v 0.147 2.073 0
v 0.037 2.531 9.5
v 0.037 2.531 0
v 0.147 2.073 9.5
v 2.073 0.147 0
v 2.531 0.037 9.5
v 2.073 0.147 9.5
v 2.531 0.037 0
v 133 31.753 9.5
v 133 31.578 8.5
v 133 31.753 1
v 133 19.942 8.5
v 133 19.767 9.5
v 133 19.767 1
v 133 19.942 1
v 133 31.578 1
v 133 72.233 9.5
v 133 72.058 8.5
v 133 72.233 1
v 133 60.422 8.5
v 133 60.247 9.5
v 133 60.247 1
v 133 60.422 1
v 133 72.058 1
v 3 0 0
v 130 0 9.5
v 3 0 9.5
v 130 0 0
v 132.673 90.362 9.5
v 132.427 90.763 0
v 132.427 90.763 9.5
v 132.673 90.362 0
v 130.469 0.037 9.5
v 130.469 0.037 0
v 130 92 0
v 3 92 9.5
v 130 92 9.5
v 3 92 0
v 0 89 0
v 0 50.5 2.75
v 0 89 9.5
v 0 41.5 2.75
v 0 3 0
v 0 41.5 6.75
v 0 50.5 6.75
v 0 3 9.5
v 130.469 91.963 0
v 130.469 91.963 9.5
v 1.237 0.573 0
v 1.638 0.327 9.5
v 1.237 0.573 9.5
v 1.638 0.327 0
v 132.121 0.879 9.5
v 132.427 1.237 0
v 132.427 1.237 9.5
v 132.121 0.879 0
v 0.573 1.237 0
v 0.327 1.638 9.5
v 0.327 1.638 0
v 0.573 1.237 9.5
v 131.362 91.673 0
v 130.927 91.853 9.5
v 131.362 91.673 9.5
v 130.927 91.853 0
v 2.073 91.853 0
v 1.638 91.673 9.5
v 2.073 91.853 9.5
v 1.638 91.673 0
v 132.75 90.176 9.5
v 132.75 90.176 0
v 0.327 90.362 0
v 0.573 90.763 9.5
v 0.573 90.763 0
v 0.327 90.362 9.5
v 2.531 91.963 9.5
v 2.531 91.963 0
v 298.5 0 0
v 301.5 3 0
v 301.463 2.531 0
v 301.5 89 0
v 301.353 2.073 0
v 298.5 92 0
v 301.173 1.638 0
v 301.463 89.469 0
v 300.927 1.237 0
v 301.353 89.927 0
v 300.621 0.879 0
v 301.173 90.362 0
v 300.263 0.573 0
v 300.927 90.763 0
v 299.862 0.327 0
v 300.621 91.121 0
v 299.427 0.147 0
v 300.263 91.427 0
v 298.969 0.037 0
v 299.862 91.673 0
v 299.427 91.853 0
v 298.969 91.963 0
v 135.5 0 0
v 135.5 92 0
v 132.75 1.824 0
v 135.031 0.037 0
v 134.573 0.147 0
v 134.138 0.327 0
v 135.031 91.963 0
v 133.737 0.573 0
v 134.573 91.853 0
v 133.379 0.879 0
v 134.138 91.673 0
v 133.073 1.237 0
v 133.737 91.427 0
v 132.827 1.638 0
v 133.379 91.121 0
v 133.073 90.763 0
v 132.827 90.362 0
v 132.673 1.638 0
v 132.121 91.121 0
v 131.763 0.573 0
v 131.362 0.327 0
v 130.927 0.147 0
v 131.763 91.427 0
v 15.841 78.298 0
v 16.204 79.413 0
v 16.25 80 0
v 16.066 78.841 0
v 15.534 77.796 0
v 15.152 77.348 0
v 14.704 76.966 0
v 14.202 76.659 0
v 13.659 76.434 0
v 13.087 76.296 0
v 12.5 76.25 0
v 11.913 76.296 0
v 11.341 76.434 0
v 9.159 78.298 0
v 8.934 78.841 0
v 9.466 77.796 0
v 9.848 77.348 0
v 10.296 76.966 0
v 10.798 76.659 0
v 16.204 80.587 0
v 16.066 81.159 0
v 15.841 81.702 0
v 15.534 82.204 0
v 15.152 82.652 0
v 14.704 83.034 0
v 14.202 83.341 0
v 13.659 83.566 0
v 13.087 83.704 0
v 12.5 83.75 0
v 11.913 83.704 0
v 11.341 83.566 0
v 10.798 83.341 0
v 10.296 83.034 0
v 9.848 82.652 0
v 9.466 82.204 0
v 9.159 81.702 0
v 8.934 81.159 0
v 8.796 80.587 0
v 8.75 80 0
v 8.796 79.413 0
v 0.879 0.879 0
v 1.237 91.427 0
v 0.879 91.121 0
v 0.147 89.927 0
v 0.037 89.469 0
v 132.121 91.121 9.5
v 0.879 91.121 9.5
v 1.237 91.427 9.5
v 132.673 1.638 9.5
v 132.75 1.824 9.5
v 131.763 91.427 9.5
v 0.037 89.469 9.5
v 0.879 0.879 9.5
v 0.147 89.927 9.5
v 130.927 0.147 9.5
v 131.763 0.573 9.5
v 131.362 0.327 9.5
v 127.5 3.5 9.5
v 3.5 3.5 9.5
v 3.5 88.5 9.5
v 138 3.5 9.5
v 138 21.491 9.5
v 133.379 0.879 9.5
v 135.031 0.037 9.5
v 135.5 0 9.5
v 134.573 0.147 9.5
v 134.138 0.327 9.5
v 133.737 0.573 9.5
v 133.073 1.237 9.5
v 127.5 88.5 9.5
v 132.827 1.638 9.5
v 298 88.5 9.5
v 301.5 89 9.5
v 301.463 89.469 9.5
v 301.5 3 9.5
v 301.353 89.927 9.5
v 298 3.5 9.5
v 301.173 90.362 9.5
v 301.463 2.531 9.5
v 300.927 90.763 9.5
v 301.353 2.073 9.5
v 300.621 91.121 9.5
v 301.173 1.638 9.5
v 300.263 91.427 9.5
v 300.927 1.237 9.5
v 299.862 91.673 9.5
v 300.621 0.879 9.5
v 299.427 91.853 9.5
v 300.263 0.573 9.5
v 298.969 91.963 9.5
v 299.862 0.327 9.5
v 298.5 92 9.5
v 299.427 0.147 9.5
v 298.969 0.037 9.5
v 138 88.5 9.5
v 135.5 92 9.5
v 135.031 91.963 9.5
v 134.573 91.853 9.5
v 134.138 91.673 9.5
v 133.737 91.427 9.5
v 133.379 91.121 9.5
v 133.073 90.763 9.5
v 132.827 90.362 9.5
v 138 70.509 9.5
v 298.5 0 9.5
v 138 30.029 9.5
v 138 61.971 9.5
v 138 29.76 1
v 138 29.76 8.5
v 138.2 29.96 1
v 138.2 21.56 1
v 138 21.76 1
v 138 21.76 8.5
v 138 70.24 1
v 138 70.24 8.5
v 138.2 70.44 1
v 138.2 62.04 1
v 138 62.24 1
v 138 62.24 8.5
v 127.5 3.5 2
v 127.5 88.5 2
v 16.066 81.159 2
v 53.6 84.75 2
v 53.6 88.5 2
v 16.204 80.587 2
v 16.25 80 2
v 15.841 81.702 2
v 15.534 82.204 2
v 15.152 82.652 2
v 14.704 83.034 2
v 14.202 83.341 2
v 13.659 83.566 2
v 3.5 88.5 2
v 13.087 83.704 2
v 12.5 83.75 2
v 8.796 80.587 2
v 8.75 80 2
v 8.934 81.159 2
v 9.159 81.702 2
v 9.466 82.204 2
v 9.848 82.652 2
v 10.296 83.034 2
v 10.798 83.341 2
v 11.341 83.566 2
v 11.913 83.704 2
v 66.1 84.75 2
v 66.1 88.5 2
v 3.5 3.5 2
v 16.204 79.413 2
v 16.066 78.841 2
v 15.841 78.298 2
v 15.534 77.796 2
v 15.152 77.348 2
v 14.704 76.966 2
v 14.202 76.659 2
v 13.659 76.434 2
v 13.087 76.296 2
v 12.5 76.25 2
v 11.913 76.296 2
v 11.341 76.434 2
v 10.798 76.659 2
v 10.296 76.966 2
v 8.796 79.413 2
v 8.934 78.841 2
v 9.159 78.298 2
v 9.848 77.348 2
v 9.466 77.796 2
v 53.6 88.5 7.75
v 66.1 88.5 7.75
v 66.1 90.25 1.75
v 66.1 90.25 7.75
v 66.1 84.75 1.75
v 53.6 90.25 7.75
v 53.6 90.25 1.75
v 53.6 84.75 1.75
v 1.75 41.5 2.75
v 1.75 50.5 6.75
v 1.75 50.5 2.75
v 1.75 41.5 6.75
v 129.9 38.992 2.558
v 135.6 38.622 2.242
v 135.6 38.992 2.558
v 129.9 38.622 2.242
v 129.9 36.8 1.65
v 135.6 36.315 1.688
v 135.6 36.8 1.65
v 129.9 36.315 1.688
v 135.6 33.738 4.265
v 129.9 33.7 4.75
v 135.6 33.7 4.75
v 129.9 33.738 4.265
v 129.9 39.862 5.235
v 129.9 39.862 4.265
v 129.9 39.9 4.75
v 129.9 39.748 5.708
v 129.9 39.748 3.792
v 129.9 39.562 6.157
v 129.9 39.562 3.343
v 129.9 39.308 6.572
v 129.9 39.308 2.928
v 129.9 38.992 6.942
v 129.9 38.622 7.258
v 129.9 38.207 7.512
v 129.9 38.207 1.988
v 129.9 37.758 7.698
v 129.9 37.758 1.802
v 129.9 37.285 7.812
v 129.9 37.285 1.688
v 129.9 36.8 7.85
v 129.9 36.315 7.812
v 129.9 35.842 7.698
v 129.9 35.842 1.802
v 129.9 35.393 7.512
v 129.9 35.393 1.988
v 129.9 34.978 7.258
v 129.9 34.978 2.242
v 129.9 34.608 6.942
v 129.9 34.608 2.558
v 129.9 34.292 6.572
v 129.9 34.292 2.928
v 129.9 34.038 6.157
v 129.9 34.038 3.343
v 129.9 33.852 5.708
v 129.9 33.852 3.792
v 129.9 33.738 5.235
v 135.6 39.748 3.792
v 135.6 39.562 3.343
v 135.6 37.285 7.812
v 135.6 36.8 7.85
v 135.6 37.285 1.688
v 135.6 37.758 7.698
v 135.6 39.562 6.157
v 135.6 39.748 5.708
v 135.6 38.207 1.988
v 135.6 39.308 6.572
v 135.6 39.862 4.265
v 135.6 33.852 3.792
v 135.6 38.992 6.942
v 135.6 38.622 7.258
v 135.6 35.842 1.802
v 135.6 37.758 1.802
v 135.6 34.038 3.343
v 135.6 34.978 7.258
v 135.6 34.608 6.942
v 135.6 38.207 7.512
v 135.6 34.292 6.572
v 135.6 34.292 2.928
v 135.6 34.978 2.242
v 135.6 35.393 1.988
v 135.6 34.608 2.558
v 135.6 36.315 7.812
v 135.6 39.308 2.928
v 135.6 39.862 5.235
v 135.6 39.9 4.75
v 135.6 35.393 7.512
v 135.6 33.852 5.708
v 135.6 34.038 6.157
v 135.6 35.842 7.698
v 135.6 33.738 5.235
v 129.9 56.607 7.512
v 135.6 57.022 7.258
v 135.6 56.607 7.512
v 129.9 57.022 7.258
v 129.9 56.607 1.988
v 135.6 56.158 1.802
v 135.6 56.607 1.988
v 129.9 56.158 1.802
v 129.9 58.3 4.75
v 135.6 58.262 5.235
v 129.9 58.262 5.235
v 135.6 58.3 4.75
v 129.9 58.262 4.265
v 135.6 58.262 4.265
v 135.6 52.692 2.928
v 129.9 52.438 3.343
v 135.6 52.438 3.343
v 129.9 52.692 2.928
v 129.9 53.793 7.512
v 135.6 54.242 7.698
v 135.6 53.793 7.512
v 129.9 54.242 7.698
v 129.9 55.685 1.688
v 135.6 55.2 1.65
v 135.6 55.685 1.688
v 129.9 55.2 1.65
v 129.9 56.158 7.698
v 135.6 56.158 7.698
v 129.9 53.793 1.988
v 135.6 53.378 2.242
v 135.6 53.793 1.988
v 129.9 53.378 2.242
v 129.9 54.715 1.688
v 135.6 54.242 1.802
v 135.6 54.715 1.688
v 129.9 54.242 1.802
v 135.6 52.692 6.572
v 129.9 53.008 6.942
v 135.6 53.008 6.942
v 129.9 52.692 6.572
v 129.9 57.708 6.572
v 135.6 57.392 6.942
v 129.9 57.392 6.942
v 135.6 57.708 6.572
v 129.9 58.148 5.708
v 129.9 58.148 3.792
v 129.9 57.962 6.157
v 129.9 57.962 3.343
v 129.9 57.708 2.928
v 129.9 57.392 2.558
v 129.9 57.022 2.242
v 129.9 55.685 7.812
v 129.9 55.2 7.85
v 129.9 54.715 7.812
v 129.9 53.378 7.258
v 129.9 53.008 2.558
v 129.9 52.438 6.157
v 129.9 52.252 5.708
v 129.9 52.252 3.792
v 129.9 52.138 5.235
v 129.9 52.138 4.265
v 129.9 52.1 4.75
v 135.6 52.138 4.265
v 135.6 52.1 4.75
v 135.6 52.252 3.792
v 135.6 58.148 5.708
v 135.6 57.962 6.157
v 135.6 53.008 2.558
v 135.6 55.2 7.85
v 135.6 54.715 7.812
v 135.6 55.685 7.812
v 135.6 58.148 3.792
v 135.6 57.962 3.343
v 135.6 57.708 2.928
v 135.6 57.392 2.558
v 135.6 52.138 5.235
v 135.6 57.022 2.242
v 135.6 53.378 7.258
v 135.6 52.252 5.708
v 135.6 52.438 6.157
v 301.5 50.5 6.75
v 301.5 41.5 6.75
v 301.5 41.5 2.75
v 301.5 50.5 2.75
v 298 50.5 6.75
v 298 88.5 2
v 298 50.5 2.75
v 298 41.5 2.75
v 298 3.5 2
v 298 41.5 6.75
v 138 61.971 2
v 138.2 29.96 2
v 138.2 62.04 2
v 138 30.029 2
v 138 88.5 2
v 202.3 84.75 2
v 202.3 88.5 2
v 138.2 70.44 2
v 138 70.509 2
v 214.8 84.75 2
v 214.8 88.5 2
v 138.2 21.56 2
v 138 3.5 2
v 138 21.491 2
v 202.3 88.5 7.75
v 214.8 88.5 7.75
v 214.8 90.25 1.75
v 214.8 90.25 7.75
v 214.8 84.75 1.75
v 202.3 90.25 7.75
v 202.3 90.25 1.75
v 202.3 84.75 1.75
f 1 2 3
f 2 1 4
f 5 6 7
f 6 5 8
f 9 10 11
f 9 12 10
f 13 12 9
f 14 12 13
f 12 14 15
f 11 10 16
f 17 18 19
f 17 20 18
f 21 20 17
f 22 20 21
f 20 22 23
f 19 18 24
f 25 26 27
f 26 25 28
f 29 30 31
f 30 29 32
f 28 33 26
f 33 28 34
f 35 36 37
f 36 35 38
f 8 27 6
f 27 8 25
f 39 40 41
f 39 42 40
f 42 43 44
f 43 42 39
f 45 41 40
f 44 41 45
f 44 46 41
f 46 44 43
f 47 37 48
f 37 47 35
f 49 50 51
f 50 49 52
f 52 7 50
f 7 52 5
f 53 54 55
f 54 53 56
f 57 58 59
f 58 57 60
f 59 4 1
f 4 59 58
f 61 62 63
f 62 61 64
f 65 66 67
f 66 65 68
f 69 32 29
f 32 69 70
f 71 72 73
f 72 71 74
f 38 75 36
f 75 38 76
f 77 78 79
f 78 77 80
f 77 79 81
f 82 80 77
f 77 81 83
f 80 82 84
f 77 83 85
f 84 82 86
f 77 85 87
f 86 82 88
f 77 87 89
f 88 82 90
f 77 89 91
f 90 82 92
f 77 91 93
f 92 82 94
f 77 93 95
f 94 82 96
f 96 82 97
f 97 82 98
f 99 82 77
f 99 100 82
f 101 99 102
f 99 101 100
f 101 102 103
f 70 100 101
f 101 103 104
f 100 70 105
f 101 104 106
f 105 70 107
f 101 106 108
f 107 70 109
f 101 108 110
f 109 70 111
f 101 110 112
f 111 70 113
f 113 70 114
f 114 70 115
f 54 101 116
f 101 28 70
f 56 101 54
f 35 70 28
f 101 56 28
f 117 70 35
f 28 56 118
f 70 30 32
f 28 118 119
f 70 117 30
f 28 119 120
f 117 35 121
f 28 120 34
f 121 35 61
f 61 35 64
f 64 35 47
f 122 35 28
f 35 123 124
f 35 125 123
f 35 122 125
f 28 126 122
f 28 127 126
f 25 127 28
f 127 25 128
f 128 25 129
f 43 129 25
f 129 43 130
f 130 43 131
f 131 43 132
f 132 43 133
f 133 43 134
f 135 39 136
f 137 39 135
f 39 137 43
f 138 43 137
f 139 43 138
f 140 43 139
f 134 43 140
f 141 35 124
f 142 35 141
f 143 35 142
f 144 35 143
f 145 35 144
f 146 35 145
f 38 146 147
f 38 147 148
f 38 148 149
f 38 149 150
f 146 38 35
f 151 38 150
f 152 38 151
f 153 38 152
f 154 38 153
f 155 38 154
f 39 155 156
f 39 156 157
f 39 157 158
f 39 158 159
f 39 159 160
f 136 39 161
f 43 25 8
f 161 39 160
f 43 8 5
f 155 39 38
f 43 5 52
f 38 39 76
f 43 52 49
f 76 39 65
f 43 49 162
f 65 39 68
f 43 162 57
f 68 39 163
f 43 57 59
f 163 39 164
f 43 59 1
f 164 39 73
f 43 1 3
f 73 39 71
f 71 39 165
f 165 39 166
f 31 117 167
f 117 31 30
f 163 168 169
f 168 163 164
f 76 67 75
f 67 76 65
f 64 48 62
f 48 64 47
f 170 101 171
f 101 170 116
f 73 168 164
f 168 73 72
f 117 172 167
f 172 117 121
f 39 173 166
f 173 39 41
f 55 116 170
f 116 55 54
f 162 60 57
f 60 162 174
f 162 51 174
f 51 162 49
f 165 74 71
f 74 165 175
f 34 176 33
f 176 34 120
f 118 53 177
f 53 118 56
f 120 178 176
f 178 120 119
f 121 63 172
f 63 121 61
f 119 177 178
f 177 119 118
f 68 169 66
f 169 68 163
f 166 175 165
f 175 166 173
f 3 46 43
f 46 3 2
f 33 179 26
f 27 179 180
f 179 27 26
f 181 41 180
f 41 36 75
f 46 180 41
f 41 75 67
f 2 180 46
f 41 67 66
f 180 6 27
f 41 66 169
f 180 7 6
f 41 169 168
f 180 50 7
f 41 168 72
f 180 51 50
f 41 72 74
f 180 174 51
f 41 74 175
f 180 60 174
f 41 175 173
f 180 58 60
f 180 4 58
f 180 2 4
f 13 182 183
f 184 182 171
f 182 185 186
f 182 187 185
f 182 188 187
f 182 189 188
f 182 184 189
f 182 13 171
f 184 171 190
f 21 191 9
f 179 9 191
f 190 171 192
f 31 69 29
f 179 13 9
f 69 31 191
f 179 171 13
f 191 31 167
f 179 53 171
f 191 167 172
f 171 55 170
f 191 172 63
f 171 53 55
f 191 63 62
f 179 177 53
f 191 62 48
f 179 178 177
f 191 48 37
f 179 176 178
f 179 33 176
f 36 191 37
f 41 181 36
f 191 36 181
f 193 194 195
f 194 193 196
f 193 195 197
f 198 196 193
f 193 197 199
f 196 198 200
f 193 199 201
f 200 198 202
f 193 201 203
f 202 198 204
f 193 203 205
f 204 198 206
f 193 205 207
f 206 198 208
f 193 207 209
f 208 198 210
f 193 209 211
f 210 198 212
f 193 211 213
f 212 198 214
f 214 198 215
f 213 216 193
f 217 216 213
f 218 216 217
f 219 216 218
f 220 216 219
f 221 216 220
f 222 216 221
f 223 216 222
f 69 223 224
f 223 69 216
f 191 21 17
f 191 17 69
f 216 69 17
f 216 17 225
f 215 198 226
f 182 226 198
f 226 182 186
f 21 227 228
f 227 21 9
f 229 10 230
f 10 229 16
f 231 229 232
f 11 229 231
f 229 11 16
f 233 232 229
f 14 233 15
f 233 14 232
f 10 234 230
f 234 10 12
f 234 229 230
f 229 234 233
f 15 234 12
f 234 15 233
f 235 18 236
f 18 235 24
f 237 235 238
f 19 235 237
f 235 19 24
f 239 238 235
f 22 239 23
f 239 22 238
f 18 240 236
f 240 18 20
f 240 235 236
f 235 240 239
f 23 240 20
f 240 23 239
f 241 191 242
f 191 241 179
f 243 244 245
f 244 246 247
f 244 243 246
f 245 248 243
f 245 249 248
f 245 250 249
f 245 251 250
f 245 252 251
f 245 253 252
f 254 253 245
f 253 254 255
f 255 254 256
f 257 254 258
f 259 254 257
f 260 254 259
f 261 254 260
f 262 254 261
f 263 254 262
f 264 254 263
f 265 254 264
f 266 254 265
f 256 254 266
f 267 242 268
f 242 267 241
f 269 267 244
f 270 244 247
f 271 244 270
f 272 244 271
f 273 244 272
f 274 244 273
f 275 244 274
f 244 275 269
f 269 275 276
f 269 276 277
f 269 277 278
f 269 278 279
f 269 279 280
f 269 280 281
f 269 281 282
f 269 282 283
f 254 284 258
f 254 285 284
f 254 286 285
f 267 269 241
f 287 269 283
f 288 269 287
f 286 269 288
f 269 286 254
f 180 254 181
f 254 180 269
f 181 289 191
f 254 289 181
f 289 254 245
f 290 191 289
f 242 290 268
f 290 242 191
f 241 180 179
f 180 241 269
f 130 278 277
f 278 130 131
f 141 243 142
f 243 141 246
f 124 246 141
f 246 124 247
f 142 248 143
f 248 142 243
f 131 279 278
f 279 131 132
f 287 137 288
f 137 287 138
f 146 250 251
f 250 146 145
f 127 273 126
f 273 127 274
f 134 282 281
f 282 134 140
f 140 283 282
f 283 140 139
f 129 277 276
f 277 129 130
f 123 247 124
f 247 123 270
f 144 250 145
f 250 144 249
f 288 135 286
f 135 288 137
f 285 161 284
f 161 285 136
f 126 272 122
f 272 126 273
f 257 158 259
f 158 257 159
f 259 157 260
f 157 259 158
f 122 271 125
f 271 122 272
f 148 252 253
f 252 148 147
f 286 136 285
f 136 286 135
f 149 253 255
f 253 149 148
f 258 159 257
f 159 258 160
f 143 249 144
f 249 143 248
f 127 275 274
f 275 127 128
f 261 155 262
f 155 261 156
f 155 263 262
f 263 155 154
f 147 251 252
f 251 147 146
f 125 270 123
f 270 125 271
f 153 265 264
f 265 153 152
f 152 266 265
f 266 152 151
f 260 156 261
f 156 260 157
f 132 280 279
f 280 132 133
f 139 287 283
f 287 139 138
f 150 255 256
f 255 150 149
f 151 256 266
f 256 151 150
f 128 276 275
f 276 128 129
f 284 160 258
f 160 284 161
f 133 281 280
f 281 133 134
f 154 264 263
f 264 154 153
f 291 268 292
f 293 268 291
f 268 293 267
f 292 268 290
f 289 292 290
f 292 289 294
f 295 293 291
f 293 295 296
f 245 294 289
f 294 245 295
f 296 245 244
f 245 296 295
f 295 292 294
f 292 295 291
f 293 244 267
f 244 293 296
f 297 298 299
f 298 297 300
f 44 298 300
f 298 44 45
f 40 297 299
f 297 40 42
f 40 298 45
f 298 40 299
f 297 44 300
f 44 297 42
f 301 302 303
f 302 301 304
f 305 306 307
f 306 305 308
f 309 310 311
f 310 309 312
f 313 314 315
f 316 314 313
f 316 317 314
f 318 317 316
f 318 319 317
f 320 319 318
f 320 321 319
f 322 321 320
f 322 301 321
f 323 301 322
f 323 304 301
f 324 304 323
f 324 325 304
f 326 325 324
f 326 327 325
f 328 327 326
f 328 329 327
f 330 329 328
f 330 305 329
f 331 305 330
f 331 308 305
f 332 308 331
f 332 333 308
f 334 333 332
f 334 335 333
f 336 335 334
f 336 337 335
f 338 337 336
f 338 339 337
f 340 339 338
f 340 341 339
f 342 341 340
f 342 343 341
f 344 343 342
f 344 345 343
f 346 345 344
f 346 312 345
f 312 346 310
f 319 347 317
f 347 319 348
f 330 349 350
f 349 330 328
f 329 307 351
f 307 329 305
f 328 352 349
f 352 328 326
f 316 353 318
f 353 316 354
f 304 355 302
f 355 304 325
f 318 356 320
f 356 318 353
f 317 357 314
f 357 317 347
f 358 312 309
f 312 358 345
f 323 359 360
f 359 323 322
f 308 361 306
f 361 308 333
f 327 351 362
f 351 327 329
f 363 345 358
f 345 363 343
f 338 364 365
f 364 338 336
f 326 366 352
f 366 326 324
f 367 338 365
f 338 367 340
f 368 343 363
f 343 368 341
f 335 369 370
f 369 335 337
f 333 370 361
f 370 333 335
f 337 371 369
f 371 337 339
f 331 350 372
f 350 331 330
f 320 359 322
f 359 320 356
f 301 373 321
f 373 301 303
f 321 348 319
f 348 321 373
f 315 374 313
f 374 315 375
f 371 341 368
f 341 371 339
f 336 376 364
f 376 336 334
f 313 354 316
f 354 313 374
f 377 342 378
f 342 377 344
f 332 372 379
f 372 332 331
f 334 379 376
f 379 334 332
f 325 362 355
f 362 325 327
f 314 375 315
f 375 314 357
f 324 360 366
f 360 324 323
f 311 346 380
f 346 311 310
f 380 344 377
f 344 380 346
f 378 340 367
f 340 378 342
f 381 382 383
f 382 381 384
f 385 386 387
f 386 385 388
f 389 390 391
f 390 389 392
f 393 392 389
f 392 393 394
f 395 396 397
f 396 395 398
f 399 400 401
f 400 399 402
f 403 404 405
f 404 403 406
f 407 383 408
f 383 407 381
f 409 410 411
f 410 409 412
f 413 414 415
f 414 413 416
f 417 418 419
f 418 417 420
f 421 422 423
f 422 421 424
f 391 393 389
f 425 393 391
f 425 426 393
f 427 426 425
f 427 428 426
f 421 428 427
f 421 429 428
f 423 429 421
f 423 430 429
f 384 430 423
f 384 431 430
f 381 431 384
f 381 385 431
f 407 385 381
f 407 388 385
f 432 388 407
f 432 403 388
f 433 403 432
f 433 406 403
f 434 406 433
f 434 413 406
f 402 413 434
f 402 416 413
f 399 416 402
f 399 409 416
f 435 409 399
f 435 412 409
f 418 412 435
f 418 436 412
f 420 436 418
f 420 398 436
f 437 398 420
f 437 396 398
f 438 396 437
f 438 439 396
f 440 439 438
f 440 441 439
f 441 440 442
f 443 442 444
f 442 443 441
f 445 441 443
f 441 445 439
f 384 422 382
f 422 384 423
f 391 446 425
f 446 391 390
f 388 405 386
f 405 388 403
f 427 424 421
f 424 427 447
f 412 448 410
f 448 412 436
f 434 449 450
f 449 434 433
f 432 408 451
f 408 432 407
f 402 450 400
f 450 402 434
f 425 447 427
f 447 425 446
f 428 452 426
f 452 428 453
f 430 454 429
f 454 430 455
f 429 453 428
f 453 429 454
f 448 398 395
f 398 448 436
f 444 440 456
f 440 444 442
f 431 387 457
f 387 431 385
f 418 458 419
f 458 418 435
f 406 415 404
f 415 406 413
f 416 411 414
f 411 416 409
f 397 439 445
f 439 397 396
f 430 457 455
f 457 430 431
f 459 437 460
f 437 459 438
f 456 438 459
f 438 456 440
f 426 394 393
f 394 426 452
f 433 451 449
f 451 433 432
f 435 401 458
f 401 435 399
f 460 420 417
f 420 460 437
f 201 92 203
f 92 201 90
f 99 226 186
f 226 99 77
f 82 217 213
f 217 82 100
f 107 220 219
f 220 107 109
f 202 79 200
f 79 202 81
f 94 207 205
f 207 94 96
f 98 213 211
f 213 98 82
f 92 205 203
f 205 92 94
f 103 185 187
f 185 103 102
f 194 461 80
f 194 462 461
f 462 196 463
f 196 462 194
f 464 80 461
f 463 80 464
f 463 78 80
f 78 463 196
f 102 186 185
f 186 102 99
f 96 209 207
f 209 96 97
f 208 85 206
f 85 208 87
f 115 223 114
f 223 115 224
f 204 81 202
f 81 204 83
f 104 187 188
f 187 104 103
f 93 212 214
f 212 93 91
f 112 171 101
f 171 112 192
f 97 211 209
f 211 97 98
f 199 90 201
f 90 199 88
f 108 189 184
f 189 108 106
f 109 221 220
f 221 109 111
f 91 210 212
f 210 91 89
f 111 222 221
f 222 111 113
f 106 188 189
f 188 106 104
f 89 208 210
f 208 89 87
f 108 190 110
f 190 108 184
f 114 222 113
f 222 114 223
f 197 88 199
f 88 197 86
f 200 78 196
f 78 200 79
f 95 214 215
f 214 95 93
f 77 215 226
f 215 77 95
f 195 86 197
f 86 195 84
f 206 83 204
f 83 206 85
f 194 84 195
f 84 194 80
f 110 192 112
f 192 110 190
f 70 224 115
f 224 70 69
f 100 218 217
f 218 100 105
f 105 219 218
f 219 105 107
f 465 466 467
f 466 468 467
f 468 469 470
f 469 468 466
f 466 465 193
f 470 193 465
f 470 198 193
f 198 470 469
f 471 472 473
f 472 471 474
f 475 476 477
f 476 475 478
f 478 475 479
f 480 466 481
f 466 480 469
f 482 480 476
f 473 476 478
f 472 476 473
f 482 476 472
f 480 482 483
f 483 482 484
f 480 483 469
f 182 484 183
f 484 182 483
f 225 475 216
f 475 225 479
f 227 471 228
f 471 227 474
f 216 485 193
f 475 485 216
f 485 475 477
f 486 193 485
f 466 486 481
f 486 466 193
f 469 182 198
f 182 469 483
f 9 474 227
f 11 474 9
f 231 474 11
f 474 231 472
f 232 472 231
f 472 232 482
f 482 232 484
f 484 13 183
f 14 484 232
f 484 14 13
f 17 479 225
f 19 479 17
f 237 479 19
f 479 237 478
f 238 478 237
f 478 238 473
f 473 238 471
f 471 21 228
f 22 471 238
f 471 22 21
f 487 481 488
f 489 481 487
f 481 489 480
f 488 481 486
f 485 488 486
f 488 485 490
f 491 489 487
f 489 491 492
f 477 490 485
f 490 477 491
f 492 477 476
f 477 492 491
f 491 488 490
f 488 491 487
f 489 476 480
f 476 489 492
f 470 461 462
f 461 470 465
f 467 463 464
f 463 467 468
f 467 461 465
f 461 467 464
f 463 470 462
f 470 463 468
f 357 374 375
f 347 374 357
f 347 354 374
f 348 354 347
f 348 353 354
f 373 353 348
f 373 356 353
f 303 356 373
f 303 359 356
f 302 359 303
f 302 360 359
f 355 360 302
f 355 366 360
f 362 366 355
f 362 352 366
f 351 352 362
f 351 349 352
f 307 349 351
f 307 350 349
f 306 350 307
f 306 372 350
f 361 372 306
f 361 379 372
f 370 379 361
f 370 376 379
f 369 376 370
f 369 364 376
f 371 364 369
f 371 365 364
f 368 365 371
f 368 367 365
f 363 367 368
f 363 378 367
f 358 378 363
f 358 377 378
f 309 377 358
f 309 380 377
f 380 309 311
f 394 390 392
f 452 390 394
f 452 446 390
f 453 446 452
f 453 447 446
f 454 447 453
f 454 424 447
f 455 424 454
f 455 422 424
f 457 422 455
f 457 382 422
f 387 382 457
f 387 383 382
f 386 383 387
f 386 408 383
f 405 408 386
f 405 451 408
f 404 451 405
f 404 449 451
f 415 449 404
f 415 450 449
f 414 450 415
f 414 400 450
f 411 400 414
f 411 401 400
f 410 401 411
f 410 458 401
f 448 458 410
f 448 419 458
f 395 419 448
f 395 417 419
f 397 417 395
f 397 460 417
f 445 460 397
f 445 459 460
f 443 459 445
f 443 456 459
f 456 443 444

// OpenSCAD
// file: interlock_params.scad
/*
 * Interlock Ergo - Shared Parametric Definitions
 * Supports both Kailh Choc v1 (crkbd/corne style) and Cherry MX standards.
 */

// Global OpenSCAD rendering resolution
$fn = 40;

// Interlocking mechanical tolerances
interlock_tol = 0.20;     // 0.2mm sliding joint clearance
magnet_d = 6.2;           // Pocket for 6mm disc magnet
magnet_h = 3.2;           // Pocket depth for 3mm magnet
fillet_r = 3.0;           // Outer chassis corner radius
wall_thickness = 3.5;     // Exterior perimeter wall

// Switch Standards
// Choc v1 (Corne/crkbd standard): 18.0mm X pitch, 17.0mm Y pitch, 1.2mm plate thickness
choc_pitch_x = 18.0;
choc_pitch_y = 17.0;
choc_switch_cutout = 13.8;
choc_plate_thickness = 1.2;
choc_case_depth = 9.5;    // Low profile depth

// MX Standard: 19.05mm X pitch, 19.05mm Y pitch, 1.5mm plate thickness
mx_pitch_x = 19.05;
mx_pitch_y = 19.05;
mx_switch_cutout = 14.0;
mx_plate_thickness = 1.5;
mx_case_depth = 12.5;     // Standard MX depth

// Common utility: Rounded box
module rounded_box(w, l, h, r) {
    hull() {
        translate([r, r, 0]) cylinder(r = r, h = h);
        translate([w - r, r, 0]) cylinder(r = r, h = h);
        translate([w - r, l - r, 0]) cylinder(r = r, h = h);
        translate([r, l - r, 0]) cylinder(r = r, h = h);
    }
}

// Interlocking male dovetail tab
module dovetail_male(depth) {
    linear_extrude(height = depth - 2) {
        polygon(points = [
            [0, -6],
            [5.5, -4],
            [5.5, 4],
            [0, 6]
        ]);
    }
}

// Interlocking female dovetail socket
module dovetail_female(depth) {
    linear_extrude(height = depth) {
        polygon(points = [
            [-0.1, -6 - interlock_tol],
            [5.5 + interlock_tol, -4 - interlock_tol],
            [5.5 + interlock_tol, 4 + interlock_tol],
            [-0.1, 6 + interlock_tol]
        ]);
    }
}

// Magnet pocket
module magnet_cavity() {
    cylinder(d = magnet_d, h = magnet_h, center = true);
}
// main file
/*
 * Interlock Ergo - Kailh Choc v1 (Corne/crkbd Low-Profile Variant)
 * Spacing: 18mm X x 17mm Y
 * Plate thickness: 1.2mm
 * Interlocking seam follows 5-T-G-B (Left) and 6-Y-H-N (Right)
 */

include <interlock_params.scad>

cols_left = 7;
cols_right = 9;
rows = 5;

// Overall dimensions
left_w = cols_left * choc_pitch_x + wall_thickness * 2;
left_l = rows * choc_pitch_y + wall_thickness * 2;

right_w = cols_right * choc_pitch_x + wall_thickness * 2;
right_l = rows * choc_pitch_y + wall_thickness * 2;

module choc_left_case() {
    difference() {
        union() {
            rounded_box(left_w, left_l, choc_case_depth, fillet_r);
            // Interlocking male tabs
            translate([left_w - 0.5, left_l * 0.28, 1]) dovetail_male(choc_case_depth);
            translate([left_w - 0.5, left_l * 0.72, 1]) dovetail_male(choc_case_depth);
        }

        // Interior cavity for Choc PCB + 500mAh LiPo
        translate([wall_thickness, wall_thickness, 2.0])
            cube([left_w - wall_thickness * 2 - 2, left_l - wall_thickness * 2, choc_case_depth]);

        // Rotary Encoder Cutout (Top-Left corner)
        translate([wall_thickness + choc_pitch_x * 0.5, left_l - wall_thickness - choc_pitch_y * 0.5, 0])
            cylinder(d = 7.5, h = choc_case_depth * 2, center = true);

        // USB-C controller port cutout
        translate([left_w * 0.45, left_l - wall_thickness - 1, choc_case_depth * 0.5])
            cube([12.5, wall_thickness + 2, 6.0], center = true);

        // Power switch cutout (Left edge)
        translate([-1, left_l * 0.5, choc_case_depth * 0.5])
            cube([wall_thickness + 2, 9.0, 4.0], center = true);

        // 6x3mm Magnet cavities on the interlocking face
        translate([left_w - 1.5, left_l * 0.4, choc_case_depth * 0.5])
            rotate([0, 90, 0]) magnet_cavity();
        translate([left_w - 1.5, left_l * 0.6, choc_case_depth * 0.5])
            rotate([0, 90, 0]) magnet_cavity();
    }
}

module choc_right_case() {
    difference() {
        rounded_box(right_w, right_l, choc_case_depth, fillet_r);

        // Interior cavity
        translate([wall_thickness + 2, wall_thickness, 2.0])
            cube([right_w - wall_thickness * 2 - 2, right_l - wall_thickness * 2, choc_case_depth]);

        // Interlocking female sockets
        translate([0, right_l * 0.28, 1]) dovetail_female(choc_case_depth);
        translate([0, right_l * 0.72, 1]) dovetail_female(choc_case_depth);

        // USB-C controller port cutout
        translate([right_w * 0.45, right_l - wall_thickness - 1, choc_case_depth * 0.5])
            cube([12.5, wall_thickness + 2, 6.0], center = true);

        // Power switch cutout (Right edge)
        translate([right_w - wall_thickness + 1, right_l * 0.5, choc_case_depth * 0.5])
            cube([wall_thickness + 2, 9.0, 4.0], center = true);

        // 6x3mm Magnet cavities on the interlocking face
        translate([1.5, right_l * 0.4, choc_case_depth * 0.5])
            rotate([0, 90, 0]) magnet_cavity();
        translate([1.5, right_l * 0.6, choc_case_depth * 0.5])
            rotate([0, 90, 0]) magnet_cavity();
    }
}

// Render mode selector: "assembly", "left", "right"
mode = "assembly";

if (mode == "left") {
    choc_left_case();
} else if (mode == "right") {
    choc_right_case();
} else {
    choc_left_case();
    translate([left_w - 0.5, 0, 0]) choc_right_case();
}
